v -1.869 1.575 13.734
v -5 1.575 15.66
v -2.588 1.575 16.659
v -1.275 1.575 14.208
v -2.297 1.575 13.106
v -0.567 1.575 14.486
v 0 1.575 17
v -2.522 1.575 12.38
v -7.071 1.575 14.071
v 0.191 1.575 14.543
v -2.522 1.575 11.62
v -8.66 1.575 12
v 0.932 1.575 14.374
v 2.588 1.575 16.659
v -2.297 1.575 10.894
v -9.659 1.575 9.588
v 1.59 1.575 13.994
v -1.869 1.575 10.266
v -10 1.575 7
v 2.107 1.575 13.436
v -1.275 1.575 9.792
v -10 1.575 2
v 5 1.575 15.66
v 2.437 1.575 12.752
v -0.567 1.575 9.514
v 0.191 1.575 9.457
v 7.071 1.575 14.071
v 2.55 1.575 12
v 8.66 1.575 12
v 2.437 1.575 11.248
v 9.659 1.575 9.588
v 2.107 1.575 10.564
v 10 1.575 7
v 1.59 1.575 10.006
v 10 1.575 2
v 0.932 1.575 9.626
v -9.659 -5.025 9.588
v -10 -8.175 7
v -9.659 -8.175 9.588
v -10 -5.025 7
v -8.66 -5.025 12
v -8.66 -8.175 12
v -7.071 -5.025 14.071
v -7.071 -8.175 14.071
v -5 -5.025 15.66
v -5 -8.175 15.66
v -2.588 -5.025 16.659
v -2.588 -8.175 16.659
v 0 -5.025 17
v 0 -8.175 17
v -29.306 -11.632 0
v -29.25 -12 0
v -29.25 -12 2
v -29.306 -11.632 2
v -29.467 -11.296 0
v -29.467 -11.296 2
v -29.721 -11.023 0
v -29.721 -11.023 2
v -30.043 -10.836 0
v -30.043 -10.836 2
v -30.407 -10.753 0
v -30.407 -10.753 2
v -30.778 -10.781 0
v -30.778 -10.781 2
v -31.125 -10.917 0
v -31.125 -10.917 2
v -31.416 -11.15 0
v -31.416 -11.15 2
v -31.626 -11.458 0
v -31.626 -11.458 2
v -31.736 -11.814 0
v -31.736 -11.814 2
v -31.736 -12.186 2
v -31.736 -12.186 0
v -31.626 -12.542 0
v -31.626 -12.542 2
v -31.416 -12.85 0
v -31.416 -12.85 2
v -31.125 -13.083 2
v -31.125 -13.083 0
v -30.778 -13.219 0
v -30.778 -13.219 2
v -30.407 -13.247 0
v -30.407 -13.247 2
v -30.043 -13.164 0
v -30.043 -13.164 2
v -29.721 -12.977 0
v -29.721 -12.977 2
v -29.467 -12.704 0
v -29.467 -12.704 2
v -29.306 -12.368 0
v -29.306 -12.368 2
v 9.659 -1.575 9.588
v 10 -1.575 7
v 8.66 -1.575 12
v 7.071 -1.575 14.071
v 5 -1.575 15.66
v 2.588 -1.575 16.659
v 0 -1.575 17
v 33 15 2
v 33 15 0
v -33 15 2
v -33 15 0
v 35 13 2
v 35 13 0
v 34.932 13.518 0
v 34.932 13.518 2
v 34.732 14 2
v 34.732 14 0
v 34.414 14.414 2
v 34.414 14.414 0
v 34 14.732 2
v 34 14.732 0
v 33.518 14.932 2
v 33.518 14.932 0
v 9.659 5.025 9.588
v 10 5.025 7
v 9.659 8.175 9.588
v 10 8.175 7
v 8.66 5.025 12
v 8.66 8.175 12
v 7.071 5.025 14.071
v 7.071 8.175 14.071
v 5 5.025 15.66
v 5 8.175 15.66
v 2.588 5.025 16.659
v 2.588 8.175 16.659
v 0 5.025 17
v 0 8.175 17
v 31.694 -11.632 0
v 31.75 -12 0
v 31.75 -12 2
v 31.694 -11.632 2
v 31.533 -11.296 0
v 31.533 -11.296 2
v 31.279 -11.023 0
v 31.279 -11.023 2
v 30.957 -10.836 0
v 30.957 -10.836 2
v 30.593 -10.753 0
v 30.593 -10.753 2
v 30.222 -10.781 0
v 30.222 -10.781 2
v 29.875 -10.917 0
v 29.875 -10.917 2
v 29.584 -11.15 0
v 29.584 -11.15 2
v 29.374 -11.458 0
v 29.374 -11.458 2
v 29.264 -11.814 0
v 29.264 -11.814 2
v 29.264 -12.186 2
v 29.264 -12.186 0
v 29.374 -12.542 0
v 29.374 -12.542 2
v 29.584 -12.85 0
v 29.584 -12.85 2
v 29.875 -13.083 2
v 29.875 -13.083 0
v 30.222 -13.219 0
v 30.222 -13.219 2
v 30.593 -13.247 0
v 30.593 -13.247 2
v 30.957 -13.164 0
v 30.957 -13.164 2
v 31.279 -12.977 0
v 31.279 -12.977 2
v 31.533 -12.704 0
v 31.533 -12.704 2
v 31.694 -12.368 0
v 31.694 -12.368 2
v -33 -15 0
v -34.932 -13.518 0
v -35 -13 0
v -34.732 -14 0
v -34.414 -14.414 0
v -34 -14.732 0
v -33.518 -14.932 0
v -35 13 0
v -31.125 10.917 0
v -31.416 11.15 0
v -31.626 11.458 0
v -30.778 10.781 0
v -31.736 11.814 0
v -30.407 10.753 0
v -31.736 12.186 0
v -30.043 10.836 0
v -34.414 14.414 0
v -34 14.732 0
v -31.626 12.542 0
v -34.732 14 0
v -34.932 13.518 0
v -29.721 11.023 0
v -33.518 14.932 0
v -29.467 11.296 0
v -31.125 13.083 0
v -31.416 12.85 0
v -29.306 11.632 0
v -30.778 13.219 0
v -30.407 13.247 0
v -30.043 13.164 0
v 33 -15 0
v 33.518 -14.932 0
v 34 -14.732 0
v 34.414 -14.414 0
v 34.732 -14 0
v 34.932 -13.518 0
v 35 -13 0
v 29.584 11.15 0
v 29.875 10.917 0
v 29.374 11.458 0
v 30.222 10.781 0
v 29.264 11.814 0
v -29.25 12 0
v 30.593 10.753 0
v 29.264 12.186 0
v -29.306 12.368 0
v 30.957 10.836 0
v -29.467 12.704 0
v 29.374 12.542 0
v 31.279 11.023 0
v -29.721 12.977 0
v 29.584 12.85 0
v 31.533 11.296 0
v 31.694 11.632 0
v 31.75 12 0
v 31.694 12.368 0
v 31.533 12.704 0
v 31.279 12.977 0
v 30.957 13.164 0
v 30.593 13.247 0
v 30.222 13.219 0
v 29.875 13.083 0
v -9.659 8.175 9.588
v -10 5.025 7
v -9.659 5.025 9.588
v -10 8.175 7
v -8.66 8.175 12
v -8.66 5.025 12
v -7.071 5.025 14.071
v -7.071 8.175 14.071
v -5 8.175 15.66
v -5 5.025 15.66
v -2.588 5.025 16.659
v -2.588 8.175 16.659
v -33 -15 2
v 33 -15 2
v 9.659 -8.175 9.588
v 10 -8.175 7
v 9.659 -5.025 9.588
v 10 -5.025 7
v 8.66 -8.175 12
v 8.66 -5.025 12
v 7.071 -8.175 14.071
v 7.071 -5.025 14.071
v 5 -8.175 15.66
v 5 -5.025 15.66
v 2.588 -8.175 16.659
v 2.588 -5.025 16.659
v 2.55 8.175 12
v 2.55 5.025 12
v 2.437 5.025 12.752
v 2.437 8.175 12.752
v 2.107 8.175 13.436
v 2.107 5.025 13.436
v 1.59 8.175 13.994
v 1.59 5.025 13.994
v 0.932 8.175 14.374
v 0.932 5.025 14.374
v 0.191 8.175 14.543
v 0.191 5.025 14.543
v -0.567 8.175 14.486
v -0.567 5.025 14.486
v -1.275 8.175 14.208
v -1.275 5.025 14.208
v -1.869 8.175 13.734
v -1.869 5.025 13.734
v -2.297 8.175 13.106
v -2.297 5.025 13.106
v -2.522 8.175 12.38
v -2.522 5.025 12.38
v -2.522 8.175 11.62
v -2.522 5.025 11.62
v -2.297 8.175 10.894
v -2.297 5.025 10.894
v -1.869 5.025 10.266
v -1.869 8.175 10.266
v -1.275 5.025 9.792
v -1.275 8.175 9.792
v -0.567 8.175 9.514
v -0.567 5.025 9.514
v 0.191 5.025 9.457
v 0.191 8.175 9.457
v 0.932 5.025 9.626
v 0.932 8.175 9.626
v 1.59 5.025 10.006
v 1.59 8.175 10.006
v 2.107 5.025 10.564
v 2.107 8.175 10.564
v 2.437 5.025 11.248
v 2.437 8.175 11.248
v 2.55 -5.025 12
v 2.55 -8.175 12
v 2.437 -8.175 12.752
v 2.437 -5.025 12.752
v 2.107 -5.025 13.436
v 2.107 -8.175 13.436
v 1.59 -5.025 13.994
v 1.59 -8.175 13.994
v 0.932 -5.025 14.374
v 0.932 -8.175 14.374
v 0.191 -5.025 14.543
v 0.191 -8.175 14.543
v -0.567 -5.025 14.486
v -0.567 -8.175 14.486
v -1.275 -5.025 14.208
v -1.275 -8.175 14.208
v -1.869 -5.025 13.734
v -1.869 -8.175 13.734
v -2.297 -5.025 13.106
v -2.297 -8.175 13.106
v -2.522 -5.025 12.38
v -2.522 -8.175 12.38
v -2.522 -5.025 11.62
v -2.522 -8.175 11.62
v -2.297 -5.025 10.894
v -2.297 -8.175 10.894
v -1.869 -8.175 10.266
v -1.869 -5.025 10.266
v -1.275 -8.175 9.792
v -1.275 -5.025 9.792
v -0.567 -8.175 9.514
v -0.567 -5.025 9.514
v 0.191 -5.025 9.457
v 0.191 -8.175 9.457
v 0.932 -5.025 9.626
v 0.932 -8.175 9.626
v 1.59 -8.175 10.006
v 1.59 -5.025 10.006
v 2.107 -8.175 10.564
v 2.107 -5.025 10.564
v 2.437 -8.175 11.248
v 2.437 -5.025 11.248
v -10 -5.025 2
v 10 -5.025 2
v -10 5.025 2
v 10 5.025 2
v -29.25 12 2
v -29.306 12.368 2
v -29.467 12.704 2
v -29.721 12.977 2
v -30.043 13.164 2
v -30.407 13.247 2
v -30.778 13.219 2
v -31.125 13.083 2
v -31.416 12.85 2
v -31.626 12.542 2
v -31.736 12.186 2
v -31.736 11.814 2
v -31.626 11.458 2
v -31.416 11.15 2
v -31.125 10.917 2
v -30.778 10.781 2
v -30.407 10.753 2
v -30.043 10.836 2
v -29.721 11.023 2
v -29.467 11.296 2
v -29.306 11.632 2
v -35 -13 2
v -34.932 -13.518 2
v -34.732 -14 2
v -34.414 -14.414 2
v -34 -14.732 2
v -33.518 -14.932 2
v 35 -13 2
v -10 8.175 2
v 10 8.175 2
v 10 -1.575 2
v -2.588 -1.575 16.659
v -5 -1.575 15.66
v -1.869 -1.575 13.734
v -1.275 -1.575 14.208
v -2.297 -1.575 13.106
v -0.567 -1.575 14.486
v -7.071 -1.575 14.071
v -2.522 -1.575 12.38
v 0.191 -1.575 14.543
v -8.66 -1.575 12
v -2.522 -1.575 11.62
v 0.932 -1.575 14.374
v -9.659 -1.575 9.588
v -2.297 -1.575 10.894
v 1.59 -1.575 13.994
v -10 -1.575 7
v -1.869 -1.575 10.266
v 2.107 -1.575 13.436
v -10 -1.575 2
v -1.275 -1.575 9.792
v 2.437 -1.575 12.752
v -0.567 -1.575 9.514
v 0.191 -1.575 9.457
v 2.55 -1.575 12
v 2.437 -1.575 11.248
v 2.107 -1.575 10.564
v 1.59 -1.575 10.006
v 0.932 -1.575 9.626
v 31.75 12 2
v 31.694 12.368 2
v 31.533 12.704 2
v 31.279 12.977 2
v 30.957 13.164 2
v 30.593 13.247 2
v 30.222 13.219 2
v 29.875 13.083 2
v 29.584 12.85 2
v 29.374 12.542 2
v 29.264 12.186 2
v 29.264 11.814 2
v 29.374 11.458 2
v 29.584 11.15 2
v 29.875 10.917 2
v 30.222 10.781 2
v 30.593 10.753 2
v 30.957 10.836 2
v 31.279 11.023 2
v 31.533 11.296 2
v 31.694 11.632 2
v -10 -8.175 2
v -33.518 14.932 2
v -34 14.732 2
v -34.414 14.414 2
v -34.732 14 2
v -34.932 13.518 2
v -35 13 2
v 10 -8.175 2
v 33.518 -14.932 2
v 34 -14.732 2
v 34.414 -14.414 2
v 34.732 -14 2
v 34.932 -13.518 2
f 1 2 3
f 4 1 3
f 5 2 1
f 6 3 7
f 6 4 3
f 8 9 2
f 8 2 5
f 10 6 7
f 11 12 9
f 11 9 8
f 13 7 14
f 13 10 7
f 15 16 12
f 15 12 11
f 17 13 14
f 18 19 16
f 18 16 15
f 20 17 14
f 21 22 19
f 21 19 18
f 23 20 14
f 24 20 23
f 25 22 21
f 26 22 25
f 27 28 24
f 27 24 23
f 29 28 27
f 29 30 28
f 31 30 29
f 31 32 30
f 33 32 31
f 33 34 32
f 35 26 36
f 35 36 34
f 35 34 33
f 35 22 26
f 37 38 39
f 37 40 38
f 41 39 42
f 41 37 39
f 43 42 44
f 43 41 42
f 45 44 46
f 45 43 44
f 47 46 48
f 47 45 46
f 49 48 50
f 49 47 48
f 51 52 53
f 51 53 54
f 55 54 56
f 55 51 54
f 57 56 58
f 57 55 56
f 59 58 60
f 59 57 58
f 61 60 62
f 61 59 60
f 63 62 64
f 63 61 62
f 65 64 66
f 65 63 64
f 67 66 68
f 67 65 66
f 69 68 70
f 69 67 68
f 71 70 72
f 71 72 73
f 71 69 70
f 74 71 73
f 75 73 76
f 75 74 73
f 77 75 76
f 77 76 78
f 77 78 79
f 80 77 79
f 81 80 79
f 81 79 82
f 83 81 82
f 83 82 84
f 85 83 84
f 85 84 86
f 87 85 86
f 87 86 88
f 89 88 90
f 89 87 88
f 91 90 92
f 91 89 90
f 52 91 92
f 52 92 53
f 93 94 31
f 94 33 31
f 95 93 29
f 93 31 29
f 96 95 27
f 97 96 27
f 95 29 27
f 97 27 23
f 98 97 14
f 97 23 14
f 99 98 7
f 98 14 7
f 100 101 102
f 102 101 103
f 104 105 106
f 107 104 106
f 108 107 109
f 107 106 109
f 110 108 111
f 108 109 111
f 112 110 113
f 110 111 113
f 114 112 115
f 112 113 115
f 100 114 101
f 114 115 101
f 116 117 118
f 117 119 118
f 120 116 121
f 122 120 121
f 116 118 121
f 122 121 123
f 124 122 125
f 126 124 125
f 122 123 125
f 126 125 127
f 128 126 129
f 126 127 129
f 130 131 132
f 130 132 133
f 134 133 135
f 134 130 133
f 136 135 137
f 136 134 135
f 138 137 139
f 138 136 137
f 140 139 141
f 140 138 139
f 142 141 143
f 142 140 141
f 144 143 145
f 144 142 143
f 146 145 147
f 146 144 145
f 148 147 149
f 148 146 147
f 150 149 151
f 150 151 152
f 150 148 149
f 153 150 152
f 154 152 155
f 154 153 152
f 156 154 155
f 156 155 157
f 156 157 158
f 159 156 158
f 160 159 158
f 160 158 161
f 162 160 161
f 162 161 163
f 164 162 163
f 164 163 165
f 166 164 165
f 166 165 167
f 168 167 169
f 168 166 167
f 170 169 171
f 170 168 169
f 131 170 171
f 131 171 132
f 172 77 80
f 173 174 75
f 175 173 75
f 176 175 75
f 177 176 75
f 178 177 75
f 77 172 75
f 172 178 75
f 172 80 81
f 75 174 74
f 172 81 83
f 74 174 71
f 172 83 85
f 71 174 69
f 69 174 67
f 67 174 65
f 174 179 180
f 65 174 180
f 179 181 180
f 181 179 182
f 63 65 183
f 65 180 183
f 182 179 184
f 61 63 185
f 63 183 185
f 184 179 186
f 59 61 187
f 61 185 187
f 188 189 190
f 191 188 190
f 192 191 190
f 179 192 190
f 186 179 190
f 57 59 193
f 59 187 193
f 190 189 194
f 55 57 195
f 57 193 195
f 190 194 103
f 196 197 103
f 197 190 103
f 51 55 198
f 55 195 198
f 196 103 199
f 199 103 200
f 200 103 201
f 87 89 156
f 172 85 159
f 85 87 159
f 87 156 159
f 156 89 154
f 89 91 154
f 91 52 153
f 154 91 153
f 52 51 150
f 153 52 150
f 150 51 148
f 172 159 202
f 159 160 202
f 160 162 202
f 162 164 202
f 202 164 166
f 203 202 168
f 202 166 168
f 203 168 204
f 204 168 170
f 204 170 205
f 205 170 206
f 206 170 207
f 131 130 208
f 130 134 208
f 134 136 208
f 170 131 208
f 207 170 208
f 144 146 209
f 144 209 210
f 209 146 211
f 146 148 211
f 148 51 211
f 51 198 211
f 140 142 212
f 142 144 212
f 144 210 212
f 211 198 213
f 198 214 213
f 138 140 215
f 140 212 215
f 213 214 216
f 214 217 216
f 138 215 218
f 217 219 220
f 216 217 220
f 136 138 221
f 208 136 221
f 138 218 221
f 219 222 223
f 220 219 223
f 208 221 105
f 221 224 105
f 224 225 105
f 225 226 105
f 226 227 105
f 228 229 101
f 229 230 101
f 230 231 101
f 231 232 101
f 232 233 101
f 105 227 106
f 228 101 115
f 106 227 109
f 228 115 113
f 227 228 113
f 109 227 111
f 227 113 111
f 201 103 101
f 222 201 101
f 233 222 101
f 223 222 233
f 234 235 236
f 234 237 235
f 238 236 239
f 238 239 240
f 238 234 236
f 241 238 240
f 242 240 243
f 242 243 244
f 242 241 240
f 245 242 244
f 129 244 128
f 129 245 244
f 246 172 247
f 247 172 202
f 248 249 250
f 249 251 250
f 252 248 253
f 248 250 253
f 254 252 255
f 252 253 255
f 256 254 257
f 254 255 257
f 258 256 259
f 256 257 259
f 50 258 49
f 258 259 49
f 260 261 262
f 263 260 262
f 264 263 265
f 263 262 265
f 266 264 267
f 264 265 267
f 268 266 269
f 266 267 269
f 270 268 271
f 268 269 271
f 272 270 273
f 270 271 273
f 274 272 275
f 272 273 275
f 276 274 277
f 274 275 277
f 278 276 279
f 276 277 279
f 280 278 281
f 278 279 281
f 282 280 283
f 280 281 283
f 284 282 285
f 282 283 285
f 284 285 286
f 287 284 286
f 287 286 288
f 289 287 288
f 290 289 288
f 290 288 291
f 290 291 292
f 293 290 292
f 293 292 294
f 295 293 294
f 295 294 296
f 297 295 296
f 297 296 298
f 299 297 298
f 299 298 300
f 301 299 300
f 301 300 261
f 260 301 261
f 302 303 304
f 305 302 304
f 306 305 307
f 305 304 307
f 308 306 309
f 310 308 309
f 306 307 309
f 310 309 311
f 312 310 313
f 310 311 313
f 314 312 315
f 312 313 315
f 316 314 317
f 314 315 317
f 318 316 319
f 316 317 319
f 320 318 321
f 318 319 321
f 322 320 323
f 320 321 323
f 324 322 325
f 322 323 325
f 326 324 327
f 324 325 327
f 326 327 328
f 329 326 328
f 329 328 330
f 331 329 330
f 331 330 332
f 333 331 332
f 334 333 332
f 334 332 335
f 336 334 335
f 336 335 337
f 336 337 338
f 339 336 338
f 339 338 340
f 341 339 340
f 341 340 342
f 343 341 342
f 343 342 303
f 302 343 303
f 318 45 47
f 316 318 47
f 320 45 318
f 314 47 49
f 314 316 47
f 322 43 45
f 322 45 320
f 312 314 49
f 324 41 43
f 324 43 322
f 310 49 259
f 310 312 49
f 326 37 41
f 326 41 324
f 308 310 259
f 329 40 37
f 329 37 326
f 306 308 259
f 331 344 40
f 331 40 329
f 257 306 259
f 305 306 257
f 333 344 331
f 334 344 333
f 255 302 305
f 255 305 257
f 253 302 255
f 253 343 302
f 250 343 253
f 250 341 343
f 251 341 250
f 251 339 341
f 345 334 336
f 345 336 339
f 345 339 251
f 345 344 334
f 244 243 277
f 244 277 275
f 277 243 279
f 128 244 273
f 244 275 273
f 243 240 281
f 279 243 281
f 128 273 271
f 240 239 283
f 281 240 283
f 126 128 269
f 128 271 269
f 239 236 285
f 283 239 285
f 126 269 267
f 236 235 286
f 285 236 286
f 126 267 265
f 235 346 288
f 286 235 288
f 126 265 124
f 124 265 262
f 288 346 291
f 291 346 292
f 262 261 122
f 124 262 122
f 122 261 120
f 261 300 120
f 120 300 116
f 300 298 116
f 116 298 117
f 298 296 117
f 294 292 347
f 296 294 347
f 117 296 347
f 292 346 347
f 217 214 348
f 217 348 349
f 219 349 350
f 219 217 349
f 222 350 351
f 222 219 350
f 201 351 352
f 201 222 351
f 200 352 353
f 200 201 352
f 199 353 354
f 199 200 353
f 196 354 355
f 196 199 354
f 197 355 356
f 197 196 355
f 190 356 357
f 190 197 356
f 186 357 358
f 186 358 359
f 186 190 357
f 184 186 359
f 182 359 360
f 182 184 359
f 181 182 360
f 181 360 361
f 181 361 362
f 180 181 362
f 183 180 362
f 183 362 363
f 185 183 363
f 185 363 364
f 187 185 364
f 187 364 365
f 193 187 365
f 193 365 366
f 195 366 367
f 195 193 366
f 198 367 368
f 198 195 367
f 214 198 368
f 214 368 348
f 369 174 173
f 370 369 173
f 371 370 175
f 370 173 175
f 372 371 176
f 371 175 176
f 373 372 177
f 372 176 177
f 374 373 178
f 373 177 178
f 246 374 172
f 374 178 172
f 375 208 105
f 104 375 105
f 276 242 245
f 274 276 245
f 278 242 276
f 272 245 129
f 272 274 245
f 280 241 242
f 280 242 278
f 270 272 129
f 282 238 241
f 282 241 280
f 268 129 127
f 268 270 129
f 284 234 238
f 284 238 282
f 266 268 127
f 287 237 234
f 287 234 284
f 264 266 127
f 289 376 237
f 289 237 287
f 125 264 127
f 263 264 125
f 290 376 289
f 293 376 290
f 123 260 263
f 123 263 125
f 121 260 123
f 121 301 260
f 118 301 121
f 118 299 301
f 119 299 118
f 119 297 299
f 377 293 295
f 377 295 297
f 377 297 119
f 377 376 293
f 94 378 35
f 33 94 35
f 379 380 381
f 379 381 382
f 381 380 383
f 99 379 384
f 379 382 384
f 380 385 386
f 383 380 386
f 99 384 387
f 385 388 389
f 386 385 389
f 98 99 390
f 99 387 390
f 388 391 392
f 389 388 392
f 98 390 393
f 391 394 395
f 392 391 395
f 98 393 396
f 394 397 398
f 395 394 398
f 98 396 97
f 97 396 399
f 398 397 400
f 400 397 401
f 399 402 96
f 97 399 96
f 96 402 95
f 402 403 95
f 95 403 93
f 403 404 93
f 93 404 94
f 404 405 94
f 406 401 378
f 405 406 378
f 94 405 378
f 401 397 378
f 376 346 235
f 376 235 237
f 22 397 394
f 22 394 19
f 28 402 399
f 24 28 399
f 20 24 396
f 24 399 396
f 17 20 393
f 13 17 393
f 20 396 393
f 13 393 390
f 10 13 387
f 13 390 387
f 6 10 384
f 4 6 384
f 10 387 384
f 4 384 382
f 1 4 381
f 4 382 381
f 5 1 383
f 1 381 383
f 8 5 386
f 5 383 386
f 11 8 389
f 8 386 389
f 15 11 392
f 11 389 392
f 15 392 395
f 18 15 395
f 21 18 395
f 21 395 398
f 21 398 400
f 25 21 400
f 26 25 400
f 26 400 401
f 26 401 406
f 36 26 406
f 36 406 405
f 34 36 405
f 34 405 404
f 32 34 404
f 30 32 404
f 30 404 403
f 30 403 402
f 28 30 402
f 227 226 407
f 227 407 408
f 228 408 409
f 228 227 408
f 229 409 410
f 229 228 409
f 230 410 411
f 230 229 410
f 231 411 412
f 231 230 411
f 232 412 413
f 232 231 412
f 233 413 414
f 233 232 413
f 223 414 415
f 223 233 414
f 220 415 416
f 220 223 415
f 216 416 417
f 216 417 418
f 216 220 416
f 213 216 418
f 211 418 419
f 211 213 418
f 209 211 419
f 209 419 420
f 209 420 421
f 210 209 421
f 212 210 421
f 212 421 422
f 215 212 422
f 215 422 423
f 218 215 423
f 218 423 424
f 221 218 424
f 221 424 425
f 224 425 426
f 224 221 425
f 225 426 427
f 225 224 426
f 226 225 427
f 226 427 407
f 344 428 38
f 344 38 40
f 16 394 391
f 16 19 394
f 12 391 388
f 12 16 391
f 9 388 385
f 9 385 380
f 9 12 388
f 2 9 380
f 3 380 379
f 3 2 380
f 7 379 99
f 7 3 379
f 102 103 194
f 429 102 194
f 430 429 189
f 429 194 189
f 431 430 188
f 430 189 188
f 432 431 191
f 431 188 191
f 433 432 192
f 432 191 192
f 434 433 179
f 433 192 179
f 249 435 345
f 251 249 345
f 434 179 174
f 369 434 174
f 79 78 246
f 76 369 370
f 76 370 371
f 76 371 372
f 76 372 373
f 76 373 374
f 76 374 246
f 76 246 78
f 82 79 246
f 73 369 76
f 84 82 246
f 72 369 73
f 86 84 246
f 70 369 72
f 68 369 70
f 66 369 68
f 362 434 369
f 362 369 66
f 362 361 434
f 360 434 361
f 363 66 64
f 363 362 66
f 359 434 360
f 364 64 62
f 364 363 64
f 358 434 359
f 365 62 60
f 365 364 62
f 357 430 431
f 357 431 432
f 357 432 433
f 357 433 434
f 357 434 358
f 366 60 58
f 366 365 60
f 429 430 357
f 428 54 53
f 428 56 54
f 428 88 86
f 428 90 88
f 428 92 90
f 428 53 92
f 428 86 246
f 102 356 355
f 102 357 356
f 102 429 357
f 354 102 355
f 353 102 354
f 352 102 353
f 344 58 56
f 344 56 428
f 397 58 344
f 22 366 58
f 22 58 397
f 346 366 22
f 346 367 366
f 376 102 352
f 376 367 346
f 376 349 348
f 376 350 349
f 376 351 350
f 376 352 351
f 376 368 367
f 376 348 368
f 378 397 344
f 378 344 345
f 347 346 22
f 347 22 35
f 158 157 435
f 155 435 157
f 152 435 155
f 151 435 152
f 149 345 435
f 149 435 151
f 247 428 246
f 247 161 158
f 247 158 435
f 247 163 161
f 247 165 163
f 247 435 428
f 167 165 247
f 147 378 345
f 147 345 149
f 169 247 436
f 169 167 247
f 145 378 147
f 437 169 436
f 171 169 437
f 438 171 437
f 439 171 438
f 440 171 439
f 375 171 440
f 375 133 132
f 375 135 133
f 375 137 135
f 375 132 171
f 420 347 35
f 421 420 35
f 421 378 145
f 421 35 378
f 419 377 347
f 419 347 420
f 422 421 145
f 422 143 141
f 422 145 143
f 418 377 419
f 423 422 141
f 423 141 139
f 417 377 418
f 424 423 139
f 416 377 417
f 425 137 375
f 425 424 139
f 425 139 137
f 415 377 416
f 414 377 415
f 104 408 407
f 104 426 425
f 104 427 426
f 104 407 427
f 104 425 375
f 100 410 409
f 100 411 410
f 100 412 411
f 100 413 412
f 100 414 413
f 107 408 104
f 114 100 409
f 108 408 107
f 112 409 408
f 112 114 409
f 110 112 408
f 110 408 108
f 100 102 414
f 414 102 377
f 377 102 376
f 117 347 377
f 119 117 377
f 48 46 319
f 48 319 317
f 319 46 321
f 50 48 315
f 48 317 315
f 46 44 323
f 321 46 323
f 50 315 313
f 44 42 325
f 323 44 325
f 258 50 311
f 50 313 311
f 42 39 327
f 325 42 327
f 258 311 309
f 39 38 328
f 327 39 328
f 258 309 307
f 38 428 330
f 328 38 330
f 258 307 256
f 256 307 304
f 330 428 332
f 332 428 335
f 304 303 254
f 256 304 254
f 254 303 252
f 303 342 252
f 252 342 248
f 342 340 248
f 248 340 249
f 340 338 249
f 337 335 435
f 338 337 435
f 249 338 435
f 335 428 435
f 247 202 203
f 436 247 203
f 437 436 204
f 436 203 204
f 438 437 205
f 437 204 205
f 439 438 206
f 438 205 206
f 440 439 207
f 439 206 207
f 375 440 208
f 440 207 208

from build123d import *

# Parameters (mm, degrees)
F0_R     = 1.25
F1_DEPTH = 2
F2_W     = 20
F2_H     = 3.15
F3_DEPTH = 15
F4_R     = 9.99999
F5_R     = 2.55
F6_DEPTH = 25


# Not quite as in the source:
# - a fillet or chamfer is up to 0.001 mm smaller than in the source, because OpenCascade refuses the exact size


with BuildPart() as f1:
    # F0 (on Top) → F1 (new body)
    with BuildSketch(Plane.XY):
        with BuildLine():
            Line((-33, -15), (33, -15))
            ThreePointArc((33, -15), (34.4142135624, -14.4142135624), (35, -13))
            Line((35, -13), (35, 13))
            ThreePointArc((35, 13), (34.4142135624, 14.4142135624), (33, 15))
            Line((33, 15), (-33, 15))
            ThreePointArc((-33, 15), (-34.4142135624, 14.4142135624), (-35, 13))
            Line((-35, 13), (-35, -13))
            ThreePointArc((-35, -13), (-34.4142135624, -14.4142135624), (-33, -15))
        make_face()
        with Locations((-30.5, -12)):
            Circle(F0_R, mode=Mode.SUBTRACT)
        with Locations((30.5, -12)):
            Circle(F0_R, mode=Mode.SUBTRACT)
        with Locations((-30.5, 12)):
            Circle(F0_R, mode=Mode.SUBTRACT)
        with Locations((30.5, 12)):
            Circle(F0_R, mode=Mode.SUBTRACT)
    extrude(amount=F1_DEPTH)

    # F2 (on face) → F3 (join)
    with BuildSketch(Plane.XY.offset(2)):
        Rectangle(F2_W, F2_H)
        with Locations((0, 6.6)):
            Rectangle(F2_W, F2_H)
        with Locations((0, -6.6)):
            Rectangle(F2_W, F2_H)
    extrude(amount=F3_DEPTH)

    # F4 (radius 10 in the source; OpenCascade refuses exactly that, so slightly less here)
    f4_edges = [f1.edges().sort_by_distance(p)[0] for p in [
        (-10, -6.6, 17),
        (10, -6.6, 17),
        (10, 0, 17),
        (-10, 0, 17),
        (-10, 6.6, 17),
        (10, 6.6, 17),
    ]]
    fillet(f4_edges, radius=F4_R)

    # F5 (on face) → F6 (cut)
    with BuildSketch(Plane.XZ.offset(8.175)):
        with Locations((0, 12)):
            Circle(F5_R)
    extrude(amount=-F6_DEPTH, mode=Mode.SUBTRACT)


solid = f1.part
